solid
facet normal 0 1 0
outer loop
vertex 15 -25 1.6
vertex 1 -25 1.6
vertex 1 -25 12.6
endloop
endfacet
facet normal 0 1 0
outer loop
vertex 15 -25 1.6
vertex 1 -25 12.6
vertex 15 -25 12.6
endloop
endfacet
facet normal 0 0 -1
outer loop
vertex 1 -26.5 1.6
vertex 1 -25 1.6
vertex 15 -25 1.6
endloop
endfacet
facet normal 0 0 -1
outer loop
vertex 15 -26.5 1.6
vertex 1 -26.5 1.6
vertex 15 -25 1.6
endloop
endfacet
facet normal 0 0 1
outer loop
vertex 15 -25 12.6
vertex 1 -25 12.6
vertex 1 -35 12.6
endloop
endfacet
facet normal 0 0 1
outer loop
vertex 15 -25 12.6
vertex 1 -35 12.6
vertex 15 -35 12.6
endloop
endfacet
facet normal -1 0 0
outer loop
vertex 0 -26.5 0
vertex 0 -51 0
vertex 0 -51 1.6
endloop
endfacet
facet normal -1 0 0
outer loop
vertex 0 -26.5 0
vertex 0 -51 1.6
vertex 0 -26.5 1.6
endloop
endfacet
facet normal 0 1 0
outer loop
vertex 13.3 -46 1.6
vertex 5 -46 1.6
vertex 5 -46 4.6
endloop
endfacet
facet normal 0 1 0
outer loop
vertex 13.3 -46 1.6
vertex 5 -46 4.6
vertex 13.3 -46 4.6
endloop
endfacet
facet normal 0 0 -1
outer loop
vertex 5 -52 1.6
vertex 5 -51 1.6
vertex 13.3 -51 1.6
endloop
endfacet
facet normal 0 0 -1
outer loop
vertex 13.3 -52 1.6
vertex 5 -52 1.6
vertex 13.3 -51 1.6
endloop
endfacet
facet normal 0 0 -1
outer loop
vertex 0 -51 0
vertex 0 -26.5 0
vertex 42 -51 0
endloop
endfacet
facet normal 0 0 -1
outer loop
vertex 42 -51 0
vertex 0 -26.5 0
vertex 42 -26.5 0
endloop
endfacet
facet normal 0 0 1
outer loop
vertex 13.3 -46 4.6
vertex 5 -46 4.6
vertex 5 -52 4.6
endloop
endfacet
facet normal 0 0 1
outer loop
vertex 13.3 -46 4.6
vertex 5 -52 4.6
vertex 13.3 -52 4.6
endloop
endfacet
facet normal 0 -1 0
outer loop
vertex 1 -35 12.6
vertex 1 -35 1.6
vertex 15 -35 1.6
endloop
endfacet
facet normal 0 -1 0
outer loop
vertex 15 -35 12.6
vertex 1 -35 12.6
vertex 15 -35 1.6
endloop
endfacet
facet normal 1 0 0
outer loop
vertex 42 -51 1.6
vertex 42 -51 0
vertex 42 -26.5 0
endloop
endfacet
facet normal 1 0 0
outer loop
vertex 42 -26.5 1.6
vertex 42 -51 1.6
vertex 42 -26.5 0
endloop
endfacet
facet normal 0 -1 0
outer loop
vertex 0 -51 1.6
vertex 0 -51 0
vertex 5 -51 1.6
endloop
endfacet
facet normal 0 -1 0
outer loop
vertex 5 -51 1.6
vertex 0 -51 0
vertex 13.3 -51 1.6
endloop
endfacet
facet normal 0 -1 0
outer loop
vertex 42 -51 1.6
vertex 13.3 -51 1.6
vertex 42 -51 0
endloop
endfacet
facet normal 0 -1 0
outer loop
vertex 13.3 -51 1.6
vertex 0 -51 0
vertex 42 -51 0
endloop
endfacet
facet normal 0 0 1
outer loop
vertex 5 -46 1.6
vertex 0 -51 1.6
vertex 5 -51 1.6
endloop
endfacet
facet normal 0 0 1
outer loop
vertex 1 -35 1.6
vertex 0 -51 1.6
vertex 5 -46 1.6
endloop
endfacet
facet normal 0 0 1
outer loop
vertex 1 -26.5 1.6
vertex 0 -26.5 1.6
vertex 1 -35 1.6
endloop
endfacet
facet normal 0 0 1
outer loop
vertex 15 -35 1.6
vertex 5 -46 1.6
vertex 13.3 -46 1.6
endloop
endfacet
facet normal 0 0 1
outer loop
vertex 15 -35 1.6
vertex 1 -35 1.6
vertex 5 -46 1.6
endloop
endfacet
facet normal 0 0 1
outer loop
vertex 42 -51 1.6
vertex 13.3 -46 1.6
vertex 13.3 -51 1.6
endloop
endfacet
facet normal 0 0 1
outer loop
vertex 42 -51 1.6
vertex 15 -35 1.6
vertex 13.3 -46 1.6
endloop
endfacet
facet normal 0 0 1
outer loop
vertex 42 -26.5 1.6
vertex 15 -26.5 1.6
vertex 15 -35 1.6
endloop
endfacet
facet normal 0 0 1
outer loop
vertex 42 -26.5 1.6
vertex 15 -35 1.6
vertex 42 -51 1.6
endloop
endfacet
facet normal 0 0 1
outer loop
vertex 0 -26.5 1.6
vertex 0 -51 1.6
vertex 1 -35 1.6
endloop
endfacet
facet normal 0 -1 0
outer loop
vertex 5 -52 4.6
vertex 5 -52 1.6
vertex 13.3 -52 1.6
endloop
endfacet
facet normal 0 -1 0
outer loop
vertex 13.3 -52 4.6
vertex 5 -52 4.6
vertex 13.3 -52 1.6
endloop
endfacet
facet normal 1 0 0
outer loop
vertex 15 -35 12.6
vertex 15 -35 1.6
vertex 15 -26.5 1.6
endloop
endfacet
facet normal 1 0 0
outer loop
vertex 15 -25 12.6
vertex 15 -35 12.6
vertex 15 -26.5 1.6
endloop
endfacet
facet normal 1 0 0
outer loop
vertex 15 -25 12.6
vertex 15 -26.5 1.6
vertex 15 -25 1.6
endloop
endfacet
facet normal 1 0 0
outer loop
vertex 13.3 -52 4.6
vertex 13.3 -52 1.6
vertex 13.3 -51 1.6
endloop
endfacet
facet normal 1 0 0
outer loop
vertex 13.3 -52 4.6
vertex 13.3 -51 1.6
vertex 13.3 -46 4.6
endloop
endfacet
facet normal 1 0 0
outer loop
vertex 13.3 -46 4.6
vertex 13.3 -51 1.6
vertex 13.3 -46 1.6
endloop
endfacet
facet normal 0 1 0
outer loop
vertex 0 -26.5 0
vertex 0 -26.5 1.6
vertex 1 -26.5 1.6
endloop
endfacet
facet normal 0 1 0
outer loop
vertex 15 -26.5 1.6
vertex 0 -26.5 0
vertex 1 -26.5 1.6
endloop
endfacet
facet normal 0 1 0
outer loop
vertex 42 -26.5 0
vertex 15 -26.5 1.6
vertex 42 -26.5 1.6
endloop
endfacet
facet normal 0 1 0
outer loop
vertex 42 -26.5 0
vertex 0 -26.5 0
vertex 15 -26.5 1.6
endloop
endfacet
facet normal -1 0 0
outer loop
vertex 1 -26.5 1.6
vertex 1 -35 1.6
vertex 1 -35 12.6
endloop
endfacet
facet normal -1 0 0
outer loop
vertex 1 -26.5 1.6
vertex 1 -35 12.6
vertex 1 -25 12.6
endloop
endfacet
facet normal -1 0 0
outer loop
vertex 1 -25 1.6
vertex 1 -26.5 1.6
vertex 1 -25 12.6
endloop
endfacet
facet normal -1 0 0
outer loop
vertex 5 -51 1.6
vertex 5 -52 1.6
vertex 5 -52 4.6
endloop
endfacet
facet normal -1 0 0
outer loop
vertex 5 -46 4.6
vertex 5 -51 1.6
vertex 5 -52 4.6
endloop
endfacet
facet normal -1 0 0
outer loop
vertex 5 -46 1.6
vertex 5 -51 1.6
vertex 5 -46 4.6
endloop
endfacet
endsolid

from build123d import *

# Parameters (mm, degrees)
BOX001_W     = 14
BOX001_H     = 10
BOX001_DEPTH = 11
BOX002_W     = 8.3
BOX002_H     = 6
BOX002_DEPTH = 3
BOX_W        = 42
BOX_H        = 24.5
BOX_DEPTH    = 1.6


with BuildPart() as cube001:
    # Box001 → Box001 (new body)
    with BuildSketch(Plane(origin=(1, 16, 1.6), x_dir=(1, 0, 0), z_dir=(0, 0, 1))):
        with Locations((7, 5)):
            Rectangle(BOX001_W, BOX001_H)
    extrude(amount=BOX001_DEPTH)


with BuildPart() as cube002:
    # Box002 → Box002 (new body)
    with BuildSketch(Plane(origin=(5, -1, 1.6), x_dir=(1, 0, 0), z_dir=(0, 0, 1))):
        with Locations((4.15, 3)):
            Rectangle(BOX002_W, BOX002_H)
    extrude(amount=BOX002_DEPTH)


with BuildPart() as mcu_pcb:
    # Box → Box (new body)
    with BuildSketch(Plane.XY):
        with Locations((21, 12.25)):
            Rectangle(BOX_W, BOX_H)
    extrude(amount=BOX_DEPTH)

    # Fusion: union Cube001, Cube002
    add(cube001.part)
    add(cube002.part)


with BuildPart() as mcu_pcb_1:
    # Fusion placement: moved
    add(mcu_pcb.part.moved(Location((0, -51, 0))))


solid = mcu_pcb_1.part
